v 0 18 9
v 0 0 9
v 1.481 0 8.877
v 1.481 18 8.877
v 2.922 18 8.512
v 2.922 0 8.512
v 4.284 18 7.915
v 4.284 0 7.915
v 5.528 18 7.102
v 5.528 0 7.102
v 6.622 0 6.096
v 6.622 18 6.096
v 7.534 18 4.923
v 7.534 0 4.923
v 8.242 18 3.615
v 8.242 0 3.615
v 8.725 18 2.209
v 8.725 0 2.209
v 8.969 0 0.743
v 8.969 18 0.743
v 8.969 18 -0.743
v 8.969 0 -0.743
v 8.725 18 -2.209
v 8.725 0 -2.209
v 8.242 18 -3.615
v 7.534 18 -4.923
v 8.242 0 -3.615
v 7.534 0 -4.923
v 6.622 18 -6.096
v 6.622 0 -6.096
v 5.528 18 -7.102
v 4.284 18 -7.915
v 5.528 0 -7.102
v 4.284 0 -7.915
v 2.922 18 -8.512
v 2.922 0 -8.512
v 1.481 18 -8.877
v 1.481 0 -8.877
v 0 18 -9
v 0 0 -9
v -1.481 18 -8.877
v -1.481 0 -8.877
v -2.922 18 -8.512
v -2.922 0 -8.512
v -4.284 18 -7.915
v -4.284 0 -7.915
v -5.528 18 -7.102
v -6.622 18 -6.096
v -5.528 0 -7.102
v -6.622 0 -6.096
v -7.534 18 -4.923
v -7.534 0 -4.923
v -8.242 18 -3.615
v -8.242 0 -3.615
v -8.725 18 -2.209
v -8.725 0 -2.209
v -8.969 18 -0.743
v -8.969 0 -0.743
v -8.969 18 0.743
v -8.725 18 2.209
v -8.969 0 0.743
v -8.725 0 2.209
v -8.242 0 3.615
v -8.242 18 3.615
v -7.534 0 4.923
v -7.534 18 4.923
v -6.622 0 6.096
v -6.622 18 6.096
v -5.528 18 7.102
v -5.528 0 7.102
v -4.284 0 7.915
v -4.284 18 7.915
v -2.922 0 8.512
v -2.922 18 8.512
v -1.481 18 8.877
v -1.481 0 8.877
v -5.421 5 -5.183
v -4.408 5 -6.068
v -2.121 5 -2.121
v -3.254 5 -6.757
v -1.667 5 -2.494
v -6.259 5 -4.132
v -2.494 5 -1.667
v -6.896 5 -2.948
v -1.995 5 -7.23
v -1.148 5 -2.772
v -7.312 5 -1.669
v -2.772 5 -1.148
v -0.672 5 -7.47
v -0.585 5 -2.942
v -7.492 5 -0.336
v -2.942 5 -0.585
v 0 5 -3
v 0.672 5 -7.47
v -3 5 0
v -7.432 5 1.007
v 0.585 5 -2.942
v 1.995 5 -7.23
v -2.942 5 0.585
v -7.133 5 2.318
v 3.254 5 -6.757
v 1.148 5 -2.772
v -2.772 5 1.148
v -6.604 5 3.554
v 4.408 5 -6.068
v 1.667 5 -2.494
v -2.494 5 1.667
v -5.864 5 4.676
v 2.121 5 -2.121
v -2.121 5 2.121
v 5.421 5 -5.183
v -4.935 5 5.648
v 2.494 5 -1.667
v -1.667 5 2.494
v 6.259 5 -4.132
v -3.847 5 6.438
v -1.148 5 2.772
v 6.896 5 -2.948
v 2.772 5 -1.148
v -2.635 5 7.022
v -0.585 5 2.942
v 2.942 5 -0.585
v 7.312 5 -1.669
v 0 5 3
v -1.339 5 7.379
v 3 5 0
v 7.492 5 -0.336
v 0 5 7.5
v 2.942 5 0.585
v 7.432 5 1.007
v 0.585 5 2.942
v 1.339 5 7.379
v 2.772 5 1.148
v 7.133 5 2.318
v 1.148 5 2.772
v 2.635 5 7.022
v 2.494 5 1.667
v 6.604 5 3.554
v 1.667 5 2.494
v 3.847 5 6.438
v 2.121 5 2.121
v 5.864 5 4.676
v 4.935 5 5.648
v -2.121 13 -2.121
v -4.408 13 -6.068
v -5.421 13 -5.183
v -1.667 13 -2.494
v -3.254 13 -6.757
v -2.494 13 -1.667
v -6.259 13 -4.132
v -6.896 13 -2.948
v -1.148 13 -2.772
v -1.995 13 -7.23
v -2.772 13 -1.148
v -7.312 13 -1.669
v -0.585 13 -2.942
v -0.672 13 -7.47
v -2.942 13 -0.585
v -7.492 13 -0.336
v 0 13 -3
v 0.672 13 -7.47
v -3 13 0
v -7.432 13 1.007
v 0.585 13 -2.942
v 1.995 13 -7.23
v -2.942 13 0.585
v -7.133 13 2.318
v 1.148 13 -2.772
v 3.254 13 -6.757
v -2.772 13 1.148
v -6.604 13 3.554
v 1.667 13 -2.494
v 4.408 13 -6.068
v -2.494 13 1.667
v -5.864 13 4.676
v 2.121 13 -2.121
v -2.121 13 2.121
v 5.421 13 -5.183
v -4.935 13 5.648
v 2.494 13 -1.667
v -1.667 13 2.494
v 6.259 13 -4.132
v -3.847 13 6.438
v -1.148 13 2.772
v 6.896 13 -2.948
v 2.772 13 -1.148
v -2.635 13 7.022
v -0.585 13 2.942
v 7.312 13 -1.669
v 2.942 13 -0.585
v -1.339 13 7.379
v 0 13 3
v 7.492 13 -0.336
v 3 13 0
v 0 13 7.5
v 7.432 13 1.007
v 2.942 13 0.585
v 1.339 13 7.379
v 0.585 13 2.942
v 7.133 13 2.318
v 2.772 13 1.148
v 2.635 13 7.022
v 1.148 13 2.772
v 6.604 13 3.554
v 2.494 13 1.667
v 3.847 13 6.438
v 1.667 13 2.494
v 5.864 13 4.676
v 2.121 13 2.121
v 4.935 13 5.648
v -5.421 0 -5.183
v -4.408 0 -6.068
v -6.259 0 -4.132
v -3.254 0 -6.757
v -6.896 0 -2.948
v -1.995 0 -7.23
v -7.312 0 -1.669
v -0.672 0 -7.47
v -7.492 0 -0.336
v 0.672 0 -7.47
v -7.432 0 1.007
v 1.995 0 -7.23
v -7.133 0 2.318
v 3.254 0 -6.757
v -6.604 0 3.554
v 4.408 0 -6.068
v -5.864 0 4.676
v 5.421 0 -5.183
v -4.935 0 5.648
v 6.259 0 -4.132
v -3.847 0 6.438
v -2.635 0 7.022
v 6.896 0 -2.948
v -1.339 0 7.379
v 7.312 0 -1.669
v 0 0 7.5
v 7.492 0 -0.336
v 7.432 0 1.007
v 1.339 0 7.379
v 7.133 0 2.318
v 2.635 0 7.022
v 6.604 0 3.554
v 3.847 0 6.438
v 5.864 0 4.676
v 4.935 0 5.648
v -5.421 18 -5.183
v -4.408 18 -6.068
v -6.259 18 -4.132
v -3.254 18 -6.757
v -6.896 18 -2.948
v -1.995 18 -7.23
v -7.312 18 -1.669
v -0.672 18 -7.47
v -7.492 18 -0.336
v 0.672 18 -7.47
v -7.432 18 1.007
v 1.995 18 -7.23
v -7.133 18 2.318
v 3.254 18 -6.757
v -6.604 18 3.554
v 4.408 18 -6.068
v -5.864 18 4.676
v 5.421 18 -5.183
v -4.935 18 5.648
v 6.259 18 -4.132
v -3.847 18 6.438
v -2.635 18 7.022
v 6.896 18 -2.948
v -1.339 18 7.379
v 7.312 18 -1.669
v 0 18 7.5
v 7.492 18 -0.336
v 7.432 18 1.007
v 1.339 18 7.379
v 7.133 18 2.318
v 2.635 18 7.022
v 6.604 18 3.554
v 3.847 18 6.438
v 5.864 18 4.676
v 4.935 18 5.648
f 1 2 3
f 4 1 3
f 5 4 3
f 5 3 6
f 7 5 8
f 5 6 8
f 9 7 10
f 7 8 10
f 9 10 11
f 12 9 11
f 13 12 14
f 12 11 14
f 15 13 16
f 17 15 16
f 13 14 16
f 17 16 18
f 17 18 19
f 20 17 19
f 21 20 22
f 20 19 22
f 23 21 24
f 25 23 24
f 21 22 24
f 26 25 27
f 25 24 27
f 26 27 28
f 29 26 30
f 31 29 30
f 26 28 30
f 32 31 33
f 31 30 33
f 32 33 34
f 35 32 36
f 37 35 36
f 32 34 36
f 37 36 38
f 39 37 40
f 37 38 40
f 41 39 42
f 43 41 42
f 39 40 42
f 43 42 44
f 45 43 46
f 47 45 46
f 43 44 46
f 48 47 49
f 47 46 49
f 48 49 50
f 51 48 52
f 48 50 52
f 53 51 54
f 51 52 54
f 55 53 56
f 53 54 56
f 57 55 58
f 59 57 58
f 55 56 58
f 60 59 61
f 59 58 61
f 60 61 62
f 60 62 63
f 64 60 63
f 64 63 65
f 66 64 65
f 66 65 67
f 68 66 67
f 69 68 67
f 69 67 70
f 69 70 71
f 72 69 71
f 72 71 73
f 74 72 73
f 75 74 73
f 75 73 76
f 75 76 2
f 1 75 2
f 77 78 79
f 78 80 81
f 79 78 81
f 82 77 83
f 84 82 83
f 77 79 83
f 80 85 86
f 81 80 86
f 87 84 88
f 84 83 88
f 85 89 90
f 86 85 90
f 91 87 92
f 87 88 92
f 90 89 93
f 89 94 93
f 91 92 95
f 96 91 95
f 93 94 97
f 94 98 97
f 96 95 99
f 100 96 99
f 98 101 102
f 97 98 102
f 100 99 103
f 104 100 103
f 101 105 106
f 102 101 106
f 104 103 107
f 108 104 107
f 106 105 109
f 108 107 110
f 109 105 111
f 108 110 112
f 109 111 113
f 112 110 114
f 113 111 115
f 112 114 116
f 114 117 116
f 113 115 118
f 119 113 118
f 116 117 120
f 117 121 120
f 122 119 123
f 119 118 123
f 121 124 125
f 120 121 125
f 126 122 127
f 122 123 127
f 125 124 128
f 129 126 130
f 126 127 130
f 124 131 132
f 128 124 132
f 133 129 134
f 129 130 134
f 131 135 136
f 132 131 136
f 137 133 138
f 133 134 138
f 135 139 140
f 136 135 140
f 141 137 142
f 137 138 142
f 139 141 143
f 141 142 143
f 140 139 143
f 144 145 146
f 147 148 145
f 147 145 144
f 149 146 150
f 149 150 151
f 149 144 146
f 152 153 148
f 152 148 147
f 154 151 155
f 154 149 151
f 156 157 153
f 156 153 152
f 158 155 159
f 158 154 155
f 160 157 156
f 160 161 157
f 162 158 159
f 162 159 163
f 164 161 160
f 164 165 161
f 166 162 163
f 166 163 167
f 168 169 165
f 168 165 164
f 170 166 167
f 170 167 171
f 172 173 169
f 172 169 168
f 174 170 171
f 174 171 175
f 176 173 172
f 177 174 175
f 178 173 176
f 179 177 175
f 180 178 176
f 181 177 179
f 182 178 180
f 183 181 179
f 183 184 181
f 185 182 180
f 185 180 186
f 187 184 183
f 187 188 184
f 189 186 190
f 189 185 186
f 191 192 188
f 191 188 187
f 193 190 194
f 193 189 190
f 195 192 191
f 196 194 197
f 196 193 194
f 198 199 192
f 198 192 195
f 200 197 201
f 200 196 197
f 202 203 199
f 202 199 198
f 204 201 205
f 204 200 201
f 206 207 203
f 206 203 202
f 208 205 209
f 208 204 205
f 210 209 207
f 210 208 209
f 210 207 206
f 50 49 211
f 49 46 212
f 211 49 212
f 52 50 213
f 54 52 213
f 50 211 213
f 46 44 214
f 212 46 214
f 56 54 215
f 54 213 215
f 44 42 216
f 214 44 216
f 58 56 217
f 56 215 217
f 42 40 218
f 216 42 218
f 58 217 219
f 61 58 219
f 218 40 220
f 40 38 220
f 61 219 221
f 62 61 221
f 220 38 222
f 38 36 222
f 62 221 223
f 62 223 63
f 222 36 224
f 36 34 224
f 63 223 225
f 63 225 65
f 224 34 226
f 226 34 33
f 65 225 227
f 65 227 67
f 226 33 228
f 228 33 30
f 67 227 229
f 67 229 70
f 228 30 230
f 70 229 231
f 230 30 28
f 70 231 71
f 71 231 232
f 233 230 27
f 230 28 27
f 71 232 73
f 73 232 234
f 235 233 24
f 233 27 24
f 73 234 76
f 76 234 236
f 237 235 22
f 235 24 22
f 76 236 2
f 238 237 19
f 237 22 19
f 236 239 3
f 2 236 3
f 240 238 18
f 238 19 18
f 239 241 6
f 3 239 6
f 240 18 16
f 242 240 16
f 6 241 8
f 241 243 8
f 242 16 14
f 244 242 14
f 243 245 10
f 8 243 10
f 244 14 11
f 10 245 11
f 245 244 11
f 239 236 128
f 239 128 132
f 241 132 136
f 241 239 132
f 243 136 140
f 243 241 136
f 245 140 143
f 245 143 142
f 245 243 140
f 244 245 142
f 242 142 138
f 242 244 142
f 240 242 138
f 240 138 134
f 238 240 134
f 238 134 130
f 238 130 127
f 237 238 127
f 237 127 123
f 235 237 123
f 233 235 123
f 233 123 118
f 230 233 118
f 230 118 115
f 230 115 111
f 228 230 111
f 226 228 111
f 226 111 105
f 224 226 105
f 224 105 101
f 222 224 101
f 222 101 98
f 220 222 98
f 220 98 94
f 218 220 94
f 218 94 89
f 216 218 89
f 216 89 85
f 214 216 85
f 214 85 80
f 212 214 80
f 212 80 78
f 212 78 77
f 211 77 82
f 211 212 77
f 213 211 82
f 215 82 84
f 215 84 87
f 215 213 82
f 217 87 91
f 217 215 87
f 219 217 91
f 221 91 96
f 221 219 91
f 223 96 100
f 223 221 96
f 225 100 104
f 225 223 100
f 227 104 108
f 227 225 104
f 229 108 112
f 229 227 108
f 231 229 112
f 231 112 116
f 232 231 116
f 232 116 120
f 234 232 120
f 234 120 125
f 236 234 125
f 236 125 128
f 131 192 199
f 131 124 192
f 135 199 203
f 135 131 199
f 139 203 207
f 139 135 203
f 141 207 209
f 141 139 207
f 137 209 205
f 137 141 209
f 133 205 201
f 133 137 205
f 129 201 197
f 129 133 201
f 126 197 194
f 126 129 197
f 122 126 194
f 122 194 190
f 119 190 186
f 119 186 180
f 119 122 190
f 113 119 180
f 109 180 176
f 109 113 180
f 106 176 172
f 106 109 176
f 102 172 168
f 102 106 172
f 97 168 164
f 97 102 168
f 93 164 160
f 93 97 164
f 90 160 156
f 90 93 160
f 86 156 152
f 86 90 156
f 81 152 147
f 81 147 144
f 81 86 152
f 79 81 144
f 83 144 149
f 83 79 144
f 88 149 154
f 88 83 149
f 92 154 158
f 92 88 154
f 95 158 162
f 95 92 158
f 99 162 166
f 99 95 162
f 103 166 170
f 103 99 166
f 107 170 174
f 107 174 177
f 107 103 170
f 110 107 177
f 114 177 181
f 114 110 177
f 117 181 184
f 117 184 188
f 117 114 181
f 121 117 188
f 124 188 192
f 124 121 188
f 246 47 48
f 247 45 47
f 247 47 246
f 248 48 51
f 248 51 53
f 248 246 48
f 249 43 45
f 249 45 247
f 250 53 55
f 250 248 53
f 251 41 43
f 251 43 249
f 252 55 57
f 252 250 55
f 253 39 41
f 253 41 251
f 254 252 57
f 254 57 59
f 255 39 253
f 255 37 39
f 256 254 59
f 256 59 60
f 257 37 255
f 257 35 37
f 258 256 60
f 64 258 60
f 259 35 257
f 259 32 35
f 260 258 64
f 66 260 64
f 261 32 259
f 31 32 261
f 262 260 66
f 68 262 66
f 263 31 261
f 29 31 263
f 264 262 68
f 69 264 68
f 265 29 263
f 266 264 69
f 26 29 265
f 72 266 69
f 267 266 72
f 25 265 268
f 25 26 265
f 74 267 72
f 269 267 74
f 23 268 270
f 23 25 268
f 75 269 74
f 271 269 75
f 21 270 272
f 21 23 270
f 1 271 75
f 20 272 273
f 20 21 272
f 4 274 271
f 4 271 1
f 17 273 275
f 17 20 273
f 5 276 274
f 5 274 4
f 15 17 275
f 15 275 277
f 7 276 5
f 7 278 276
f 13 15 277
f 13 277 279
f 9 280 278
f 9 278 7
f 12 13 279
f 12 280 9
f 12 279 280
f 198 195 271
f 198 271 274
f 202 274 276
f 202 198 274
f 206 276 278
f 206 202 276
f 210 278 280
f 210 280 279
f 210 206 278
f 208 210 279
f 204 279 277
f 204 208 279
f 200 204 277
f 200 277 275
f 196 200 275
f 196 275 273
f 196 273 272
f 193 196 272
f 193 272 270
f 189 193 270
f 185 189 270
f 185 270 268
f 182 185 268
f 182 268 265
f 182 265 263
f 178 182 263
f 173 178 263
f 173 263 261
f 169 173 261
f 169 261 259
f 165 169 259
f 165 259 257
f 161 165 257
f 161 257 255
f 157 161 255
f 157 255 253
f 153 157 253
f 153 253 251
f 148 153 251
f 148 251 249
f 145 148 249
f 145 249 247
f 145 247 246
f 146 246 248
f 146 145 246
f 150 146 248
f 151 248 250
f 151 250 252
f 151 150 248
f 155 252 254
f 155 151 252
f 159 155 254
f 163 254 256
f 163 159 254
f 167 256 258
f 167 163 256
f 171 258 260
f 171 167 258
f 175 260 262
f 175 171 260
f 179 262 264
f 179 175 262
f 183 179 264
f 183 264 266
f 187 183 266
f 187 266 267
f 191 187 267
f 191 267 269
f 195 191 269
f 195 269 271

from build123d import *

# Parameters (mm, degrees)
SKETCH1_R           = 9
SKETCH1_R_2         = 7.5
BOSS_EXTRUDE1_DEPTH = 18
SKETCH2_R           = 7.5
SKETCH2_R_2         = 3
BOSS_EXTRUDE2_DEPTH = 4


with BuildPart() as part:
    # Sketch1 → Boss-Extrude1 (new body)
    with BuildSketch(Plane(origin=(0, 0, 0), x_dir=(1, 0, 0), z_dir=(0, 1, 0))):
        with Locations(Location((0, 0, 0), (0, 0, 270))):
            Circle(SKETCH1_R)
        with Locations(Location((0, 0, 0), (0, 0, 270))):
            Circle(SKETCH1_R_2, mode=Mode.SUBTRACT)
    extrude(amount=BOSS_EXTRUDE1_DEPTH)

    # Sketch2 → Boss-Extrude2 (add, symmetric)
    with BuildSketch(Plane(origin=(0, 9, 0), x_dir=(1, 0, 0), z_dir=(0, 1, 0))):
        with Locations(Location((0, 0, 0), (0, 0, 270))):
            Circle(SKETCH2_R)
        with Locations(Location((0, 0, 0), (0, 0, 270))):
            Circle(SKETCH2_R_2, mode=Mode.SUBTRACT)
    extrude(amount=BOSS_EXTRUDE2_DEPTH, both=True)


solid = part.part
